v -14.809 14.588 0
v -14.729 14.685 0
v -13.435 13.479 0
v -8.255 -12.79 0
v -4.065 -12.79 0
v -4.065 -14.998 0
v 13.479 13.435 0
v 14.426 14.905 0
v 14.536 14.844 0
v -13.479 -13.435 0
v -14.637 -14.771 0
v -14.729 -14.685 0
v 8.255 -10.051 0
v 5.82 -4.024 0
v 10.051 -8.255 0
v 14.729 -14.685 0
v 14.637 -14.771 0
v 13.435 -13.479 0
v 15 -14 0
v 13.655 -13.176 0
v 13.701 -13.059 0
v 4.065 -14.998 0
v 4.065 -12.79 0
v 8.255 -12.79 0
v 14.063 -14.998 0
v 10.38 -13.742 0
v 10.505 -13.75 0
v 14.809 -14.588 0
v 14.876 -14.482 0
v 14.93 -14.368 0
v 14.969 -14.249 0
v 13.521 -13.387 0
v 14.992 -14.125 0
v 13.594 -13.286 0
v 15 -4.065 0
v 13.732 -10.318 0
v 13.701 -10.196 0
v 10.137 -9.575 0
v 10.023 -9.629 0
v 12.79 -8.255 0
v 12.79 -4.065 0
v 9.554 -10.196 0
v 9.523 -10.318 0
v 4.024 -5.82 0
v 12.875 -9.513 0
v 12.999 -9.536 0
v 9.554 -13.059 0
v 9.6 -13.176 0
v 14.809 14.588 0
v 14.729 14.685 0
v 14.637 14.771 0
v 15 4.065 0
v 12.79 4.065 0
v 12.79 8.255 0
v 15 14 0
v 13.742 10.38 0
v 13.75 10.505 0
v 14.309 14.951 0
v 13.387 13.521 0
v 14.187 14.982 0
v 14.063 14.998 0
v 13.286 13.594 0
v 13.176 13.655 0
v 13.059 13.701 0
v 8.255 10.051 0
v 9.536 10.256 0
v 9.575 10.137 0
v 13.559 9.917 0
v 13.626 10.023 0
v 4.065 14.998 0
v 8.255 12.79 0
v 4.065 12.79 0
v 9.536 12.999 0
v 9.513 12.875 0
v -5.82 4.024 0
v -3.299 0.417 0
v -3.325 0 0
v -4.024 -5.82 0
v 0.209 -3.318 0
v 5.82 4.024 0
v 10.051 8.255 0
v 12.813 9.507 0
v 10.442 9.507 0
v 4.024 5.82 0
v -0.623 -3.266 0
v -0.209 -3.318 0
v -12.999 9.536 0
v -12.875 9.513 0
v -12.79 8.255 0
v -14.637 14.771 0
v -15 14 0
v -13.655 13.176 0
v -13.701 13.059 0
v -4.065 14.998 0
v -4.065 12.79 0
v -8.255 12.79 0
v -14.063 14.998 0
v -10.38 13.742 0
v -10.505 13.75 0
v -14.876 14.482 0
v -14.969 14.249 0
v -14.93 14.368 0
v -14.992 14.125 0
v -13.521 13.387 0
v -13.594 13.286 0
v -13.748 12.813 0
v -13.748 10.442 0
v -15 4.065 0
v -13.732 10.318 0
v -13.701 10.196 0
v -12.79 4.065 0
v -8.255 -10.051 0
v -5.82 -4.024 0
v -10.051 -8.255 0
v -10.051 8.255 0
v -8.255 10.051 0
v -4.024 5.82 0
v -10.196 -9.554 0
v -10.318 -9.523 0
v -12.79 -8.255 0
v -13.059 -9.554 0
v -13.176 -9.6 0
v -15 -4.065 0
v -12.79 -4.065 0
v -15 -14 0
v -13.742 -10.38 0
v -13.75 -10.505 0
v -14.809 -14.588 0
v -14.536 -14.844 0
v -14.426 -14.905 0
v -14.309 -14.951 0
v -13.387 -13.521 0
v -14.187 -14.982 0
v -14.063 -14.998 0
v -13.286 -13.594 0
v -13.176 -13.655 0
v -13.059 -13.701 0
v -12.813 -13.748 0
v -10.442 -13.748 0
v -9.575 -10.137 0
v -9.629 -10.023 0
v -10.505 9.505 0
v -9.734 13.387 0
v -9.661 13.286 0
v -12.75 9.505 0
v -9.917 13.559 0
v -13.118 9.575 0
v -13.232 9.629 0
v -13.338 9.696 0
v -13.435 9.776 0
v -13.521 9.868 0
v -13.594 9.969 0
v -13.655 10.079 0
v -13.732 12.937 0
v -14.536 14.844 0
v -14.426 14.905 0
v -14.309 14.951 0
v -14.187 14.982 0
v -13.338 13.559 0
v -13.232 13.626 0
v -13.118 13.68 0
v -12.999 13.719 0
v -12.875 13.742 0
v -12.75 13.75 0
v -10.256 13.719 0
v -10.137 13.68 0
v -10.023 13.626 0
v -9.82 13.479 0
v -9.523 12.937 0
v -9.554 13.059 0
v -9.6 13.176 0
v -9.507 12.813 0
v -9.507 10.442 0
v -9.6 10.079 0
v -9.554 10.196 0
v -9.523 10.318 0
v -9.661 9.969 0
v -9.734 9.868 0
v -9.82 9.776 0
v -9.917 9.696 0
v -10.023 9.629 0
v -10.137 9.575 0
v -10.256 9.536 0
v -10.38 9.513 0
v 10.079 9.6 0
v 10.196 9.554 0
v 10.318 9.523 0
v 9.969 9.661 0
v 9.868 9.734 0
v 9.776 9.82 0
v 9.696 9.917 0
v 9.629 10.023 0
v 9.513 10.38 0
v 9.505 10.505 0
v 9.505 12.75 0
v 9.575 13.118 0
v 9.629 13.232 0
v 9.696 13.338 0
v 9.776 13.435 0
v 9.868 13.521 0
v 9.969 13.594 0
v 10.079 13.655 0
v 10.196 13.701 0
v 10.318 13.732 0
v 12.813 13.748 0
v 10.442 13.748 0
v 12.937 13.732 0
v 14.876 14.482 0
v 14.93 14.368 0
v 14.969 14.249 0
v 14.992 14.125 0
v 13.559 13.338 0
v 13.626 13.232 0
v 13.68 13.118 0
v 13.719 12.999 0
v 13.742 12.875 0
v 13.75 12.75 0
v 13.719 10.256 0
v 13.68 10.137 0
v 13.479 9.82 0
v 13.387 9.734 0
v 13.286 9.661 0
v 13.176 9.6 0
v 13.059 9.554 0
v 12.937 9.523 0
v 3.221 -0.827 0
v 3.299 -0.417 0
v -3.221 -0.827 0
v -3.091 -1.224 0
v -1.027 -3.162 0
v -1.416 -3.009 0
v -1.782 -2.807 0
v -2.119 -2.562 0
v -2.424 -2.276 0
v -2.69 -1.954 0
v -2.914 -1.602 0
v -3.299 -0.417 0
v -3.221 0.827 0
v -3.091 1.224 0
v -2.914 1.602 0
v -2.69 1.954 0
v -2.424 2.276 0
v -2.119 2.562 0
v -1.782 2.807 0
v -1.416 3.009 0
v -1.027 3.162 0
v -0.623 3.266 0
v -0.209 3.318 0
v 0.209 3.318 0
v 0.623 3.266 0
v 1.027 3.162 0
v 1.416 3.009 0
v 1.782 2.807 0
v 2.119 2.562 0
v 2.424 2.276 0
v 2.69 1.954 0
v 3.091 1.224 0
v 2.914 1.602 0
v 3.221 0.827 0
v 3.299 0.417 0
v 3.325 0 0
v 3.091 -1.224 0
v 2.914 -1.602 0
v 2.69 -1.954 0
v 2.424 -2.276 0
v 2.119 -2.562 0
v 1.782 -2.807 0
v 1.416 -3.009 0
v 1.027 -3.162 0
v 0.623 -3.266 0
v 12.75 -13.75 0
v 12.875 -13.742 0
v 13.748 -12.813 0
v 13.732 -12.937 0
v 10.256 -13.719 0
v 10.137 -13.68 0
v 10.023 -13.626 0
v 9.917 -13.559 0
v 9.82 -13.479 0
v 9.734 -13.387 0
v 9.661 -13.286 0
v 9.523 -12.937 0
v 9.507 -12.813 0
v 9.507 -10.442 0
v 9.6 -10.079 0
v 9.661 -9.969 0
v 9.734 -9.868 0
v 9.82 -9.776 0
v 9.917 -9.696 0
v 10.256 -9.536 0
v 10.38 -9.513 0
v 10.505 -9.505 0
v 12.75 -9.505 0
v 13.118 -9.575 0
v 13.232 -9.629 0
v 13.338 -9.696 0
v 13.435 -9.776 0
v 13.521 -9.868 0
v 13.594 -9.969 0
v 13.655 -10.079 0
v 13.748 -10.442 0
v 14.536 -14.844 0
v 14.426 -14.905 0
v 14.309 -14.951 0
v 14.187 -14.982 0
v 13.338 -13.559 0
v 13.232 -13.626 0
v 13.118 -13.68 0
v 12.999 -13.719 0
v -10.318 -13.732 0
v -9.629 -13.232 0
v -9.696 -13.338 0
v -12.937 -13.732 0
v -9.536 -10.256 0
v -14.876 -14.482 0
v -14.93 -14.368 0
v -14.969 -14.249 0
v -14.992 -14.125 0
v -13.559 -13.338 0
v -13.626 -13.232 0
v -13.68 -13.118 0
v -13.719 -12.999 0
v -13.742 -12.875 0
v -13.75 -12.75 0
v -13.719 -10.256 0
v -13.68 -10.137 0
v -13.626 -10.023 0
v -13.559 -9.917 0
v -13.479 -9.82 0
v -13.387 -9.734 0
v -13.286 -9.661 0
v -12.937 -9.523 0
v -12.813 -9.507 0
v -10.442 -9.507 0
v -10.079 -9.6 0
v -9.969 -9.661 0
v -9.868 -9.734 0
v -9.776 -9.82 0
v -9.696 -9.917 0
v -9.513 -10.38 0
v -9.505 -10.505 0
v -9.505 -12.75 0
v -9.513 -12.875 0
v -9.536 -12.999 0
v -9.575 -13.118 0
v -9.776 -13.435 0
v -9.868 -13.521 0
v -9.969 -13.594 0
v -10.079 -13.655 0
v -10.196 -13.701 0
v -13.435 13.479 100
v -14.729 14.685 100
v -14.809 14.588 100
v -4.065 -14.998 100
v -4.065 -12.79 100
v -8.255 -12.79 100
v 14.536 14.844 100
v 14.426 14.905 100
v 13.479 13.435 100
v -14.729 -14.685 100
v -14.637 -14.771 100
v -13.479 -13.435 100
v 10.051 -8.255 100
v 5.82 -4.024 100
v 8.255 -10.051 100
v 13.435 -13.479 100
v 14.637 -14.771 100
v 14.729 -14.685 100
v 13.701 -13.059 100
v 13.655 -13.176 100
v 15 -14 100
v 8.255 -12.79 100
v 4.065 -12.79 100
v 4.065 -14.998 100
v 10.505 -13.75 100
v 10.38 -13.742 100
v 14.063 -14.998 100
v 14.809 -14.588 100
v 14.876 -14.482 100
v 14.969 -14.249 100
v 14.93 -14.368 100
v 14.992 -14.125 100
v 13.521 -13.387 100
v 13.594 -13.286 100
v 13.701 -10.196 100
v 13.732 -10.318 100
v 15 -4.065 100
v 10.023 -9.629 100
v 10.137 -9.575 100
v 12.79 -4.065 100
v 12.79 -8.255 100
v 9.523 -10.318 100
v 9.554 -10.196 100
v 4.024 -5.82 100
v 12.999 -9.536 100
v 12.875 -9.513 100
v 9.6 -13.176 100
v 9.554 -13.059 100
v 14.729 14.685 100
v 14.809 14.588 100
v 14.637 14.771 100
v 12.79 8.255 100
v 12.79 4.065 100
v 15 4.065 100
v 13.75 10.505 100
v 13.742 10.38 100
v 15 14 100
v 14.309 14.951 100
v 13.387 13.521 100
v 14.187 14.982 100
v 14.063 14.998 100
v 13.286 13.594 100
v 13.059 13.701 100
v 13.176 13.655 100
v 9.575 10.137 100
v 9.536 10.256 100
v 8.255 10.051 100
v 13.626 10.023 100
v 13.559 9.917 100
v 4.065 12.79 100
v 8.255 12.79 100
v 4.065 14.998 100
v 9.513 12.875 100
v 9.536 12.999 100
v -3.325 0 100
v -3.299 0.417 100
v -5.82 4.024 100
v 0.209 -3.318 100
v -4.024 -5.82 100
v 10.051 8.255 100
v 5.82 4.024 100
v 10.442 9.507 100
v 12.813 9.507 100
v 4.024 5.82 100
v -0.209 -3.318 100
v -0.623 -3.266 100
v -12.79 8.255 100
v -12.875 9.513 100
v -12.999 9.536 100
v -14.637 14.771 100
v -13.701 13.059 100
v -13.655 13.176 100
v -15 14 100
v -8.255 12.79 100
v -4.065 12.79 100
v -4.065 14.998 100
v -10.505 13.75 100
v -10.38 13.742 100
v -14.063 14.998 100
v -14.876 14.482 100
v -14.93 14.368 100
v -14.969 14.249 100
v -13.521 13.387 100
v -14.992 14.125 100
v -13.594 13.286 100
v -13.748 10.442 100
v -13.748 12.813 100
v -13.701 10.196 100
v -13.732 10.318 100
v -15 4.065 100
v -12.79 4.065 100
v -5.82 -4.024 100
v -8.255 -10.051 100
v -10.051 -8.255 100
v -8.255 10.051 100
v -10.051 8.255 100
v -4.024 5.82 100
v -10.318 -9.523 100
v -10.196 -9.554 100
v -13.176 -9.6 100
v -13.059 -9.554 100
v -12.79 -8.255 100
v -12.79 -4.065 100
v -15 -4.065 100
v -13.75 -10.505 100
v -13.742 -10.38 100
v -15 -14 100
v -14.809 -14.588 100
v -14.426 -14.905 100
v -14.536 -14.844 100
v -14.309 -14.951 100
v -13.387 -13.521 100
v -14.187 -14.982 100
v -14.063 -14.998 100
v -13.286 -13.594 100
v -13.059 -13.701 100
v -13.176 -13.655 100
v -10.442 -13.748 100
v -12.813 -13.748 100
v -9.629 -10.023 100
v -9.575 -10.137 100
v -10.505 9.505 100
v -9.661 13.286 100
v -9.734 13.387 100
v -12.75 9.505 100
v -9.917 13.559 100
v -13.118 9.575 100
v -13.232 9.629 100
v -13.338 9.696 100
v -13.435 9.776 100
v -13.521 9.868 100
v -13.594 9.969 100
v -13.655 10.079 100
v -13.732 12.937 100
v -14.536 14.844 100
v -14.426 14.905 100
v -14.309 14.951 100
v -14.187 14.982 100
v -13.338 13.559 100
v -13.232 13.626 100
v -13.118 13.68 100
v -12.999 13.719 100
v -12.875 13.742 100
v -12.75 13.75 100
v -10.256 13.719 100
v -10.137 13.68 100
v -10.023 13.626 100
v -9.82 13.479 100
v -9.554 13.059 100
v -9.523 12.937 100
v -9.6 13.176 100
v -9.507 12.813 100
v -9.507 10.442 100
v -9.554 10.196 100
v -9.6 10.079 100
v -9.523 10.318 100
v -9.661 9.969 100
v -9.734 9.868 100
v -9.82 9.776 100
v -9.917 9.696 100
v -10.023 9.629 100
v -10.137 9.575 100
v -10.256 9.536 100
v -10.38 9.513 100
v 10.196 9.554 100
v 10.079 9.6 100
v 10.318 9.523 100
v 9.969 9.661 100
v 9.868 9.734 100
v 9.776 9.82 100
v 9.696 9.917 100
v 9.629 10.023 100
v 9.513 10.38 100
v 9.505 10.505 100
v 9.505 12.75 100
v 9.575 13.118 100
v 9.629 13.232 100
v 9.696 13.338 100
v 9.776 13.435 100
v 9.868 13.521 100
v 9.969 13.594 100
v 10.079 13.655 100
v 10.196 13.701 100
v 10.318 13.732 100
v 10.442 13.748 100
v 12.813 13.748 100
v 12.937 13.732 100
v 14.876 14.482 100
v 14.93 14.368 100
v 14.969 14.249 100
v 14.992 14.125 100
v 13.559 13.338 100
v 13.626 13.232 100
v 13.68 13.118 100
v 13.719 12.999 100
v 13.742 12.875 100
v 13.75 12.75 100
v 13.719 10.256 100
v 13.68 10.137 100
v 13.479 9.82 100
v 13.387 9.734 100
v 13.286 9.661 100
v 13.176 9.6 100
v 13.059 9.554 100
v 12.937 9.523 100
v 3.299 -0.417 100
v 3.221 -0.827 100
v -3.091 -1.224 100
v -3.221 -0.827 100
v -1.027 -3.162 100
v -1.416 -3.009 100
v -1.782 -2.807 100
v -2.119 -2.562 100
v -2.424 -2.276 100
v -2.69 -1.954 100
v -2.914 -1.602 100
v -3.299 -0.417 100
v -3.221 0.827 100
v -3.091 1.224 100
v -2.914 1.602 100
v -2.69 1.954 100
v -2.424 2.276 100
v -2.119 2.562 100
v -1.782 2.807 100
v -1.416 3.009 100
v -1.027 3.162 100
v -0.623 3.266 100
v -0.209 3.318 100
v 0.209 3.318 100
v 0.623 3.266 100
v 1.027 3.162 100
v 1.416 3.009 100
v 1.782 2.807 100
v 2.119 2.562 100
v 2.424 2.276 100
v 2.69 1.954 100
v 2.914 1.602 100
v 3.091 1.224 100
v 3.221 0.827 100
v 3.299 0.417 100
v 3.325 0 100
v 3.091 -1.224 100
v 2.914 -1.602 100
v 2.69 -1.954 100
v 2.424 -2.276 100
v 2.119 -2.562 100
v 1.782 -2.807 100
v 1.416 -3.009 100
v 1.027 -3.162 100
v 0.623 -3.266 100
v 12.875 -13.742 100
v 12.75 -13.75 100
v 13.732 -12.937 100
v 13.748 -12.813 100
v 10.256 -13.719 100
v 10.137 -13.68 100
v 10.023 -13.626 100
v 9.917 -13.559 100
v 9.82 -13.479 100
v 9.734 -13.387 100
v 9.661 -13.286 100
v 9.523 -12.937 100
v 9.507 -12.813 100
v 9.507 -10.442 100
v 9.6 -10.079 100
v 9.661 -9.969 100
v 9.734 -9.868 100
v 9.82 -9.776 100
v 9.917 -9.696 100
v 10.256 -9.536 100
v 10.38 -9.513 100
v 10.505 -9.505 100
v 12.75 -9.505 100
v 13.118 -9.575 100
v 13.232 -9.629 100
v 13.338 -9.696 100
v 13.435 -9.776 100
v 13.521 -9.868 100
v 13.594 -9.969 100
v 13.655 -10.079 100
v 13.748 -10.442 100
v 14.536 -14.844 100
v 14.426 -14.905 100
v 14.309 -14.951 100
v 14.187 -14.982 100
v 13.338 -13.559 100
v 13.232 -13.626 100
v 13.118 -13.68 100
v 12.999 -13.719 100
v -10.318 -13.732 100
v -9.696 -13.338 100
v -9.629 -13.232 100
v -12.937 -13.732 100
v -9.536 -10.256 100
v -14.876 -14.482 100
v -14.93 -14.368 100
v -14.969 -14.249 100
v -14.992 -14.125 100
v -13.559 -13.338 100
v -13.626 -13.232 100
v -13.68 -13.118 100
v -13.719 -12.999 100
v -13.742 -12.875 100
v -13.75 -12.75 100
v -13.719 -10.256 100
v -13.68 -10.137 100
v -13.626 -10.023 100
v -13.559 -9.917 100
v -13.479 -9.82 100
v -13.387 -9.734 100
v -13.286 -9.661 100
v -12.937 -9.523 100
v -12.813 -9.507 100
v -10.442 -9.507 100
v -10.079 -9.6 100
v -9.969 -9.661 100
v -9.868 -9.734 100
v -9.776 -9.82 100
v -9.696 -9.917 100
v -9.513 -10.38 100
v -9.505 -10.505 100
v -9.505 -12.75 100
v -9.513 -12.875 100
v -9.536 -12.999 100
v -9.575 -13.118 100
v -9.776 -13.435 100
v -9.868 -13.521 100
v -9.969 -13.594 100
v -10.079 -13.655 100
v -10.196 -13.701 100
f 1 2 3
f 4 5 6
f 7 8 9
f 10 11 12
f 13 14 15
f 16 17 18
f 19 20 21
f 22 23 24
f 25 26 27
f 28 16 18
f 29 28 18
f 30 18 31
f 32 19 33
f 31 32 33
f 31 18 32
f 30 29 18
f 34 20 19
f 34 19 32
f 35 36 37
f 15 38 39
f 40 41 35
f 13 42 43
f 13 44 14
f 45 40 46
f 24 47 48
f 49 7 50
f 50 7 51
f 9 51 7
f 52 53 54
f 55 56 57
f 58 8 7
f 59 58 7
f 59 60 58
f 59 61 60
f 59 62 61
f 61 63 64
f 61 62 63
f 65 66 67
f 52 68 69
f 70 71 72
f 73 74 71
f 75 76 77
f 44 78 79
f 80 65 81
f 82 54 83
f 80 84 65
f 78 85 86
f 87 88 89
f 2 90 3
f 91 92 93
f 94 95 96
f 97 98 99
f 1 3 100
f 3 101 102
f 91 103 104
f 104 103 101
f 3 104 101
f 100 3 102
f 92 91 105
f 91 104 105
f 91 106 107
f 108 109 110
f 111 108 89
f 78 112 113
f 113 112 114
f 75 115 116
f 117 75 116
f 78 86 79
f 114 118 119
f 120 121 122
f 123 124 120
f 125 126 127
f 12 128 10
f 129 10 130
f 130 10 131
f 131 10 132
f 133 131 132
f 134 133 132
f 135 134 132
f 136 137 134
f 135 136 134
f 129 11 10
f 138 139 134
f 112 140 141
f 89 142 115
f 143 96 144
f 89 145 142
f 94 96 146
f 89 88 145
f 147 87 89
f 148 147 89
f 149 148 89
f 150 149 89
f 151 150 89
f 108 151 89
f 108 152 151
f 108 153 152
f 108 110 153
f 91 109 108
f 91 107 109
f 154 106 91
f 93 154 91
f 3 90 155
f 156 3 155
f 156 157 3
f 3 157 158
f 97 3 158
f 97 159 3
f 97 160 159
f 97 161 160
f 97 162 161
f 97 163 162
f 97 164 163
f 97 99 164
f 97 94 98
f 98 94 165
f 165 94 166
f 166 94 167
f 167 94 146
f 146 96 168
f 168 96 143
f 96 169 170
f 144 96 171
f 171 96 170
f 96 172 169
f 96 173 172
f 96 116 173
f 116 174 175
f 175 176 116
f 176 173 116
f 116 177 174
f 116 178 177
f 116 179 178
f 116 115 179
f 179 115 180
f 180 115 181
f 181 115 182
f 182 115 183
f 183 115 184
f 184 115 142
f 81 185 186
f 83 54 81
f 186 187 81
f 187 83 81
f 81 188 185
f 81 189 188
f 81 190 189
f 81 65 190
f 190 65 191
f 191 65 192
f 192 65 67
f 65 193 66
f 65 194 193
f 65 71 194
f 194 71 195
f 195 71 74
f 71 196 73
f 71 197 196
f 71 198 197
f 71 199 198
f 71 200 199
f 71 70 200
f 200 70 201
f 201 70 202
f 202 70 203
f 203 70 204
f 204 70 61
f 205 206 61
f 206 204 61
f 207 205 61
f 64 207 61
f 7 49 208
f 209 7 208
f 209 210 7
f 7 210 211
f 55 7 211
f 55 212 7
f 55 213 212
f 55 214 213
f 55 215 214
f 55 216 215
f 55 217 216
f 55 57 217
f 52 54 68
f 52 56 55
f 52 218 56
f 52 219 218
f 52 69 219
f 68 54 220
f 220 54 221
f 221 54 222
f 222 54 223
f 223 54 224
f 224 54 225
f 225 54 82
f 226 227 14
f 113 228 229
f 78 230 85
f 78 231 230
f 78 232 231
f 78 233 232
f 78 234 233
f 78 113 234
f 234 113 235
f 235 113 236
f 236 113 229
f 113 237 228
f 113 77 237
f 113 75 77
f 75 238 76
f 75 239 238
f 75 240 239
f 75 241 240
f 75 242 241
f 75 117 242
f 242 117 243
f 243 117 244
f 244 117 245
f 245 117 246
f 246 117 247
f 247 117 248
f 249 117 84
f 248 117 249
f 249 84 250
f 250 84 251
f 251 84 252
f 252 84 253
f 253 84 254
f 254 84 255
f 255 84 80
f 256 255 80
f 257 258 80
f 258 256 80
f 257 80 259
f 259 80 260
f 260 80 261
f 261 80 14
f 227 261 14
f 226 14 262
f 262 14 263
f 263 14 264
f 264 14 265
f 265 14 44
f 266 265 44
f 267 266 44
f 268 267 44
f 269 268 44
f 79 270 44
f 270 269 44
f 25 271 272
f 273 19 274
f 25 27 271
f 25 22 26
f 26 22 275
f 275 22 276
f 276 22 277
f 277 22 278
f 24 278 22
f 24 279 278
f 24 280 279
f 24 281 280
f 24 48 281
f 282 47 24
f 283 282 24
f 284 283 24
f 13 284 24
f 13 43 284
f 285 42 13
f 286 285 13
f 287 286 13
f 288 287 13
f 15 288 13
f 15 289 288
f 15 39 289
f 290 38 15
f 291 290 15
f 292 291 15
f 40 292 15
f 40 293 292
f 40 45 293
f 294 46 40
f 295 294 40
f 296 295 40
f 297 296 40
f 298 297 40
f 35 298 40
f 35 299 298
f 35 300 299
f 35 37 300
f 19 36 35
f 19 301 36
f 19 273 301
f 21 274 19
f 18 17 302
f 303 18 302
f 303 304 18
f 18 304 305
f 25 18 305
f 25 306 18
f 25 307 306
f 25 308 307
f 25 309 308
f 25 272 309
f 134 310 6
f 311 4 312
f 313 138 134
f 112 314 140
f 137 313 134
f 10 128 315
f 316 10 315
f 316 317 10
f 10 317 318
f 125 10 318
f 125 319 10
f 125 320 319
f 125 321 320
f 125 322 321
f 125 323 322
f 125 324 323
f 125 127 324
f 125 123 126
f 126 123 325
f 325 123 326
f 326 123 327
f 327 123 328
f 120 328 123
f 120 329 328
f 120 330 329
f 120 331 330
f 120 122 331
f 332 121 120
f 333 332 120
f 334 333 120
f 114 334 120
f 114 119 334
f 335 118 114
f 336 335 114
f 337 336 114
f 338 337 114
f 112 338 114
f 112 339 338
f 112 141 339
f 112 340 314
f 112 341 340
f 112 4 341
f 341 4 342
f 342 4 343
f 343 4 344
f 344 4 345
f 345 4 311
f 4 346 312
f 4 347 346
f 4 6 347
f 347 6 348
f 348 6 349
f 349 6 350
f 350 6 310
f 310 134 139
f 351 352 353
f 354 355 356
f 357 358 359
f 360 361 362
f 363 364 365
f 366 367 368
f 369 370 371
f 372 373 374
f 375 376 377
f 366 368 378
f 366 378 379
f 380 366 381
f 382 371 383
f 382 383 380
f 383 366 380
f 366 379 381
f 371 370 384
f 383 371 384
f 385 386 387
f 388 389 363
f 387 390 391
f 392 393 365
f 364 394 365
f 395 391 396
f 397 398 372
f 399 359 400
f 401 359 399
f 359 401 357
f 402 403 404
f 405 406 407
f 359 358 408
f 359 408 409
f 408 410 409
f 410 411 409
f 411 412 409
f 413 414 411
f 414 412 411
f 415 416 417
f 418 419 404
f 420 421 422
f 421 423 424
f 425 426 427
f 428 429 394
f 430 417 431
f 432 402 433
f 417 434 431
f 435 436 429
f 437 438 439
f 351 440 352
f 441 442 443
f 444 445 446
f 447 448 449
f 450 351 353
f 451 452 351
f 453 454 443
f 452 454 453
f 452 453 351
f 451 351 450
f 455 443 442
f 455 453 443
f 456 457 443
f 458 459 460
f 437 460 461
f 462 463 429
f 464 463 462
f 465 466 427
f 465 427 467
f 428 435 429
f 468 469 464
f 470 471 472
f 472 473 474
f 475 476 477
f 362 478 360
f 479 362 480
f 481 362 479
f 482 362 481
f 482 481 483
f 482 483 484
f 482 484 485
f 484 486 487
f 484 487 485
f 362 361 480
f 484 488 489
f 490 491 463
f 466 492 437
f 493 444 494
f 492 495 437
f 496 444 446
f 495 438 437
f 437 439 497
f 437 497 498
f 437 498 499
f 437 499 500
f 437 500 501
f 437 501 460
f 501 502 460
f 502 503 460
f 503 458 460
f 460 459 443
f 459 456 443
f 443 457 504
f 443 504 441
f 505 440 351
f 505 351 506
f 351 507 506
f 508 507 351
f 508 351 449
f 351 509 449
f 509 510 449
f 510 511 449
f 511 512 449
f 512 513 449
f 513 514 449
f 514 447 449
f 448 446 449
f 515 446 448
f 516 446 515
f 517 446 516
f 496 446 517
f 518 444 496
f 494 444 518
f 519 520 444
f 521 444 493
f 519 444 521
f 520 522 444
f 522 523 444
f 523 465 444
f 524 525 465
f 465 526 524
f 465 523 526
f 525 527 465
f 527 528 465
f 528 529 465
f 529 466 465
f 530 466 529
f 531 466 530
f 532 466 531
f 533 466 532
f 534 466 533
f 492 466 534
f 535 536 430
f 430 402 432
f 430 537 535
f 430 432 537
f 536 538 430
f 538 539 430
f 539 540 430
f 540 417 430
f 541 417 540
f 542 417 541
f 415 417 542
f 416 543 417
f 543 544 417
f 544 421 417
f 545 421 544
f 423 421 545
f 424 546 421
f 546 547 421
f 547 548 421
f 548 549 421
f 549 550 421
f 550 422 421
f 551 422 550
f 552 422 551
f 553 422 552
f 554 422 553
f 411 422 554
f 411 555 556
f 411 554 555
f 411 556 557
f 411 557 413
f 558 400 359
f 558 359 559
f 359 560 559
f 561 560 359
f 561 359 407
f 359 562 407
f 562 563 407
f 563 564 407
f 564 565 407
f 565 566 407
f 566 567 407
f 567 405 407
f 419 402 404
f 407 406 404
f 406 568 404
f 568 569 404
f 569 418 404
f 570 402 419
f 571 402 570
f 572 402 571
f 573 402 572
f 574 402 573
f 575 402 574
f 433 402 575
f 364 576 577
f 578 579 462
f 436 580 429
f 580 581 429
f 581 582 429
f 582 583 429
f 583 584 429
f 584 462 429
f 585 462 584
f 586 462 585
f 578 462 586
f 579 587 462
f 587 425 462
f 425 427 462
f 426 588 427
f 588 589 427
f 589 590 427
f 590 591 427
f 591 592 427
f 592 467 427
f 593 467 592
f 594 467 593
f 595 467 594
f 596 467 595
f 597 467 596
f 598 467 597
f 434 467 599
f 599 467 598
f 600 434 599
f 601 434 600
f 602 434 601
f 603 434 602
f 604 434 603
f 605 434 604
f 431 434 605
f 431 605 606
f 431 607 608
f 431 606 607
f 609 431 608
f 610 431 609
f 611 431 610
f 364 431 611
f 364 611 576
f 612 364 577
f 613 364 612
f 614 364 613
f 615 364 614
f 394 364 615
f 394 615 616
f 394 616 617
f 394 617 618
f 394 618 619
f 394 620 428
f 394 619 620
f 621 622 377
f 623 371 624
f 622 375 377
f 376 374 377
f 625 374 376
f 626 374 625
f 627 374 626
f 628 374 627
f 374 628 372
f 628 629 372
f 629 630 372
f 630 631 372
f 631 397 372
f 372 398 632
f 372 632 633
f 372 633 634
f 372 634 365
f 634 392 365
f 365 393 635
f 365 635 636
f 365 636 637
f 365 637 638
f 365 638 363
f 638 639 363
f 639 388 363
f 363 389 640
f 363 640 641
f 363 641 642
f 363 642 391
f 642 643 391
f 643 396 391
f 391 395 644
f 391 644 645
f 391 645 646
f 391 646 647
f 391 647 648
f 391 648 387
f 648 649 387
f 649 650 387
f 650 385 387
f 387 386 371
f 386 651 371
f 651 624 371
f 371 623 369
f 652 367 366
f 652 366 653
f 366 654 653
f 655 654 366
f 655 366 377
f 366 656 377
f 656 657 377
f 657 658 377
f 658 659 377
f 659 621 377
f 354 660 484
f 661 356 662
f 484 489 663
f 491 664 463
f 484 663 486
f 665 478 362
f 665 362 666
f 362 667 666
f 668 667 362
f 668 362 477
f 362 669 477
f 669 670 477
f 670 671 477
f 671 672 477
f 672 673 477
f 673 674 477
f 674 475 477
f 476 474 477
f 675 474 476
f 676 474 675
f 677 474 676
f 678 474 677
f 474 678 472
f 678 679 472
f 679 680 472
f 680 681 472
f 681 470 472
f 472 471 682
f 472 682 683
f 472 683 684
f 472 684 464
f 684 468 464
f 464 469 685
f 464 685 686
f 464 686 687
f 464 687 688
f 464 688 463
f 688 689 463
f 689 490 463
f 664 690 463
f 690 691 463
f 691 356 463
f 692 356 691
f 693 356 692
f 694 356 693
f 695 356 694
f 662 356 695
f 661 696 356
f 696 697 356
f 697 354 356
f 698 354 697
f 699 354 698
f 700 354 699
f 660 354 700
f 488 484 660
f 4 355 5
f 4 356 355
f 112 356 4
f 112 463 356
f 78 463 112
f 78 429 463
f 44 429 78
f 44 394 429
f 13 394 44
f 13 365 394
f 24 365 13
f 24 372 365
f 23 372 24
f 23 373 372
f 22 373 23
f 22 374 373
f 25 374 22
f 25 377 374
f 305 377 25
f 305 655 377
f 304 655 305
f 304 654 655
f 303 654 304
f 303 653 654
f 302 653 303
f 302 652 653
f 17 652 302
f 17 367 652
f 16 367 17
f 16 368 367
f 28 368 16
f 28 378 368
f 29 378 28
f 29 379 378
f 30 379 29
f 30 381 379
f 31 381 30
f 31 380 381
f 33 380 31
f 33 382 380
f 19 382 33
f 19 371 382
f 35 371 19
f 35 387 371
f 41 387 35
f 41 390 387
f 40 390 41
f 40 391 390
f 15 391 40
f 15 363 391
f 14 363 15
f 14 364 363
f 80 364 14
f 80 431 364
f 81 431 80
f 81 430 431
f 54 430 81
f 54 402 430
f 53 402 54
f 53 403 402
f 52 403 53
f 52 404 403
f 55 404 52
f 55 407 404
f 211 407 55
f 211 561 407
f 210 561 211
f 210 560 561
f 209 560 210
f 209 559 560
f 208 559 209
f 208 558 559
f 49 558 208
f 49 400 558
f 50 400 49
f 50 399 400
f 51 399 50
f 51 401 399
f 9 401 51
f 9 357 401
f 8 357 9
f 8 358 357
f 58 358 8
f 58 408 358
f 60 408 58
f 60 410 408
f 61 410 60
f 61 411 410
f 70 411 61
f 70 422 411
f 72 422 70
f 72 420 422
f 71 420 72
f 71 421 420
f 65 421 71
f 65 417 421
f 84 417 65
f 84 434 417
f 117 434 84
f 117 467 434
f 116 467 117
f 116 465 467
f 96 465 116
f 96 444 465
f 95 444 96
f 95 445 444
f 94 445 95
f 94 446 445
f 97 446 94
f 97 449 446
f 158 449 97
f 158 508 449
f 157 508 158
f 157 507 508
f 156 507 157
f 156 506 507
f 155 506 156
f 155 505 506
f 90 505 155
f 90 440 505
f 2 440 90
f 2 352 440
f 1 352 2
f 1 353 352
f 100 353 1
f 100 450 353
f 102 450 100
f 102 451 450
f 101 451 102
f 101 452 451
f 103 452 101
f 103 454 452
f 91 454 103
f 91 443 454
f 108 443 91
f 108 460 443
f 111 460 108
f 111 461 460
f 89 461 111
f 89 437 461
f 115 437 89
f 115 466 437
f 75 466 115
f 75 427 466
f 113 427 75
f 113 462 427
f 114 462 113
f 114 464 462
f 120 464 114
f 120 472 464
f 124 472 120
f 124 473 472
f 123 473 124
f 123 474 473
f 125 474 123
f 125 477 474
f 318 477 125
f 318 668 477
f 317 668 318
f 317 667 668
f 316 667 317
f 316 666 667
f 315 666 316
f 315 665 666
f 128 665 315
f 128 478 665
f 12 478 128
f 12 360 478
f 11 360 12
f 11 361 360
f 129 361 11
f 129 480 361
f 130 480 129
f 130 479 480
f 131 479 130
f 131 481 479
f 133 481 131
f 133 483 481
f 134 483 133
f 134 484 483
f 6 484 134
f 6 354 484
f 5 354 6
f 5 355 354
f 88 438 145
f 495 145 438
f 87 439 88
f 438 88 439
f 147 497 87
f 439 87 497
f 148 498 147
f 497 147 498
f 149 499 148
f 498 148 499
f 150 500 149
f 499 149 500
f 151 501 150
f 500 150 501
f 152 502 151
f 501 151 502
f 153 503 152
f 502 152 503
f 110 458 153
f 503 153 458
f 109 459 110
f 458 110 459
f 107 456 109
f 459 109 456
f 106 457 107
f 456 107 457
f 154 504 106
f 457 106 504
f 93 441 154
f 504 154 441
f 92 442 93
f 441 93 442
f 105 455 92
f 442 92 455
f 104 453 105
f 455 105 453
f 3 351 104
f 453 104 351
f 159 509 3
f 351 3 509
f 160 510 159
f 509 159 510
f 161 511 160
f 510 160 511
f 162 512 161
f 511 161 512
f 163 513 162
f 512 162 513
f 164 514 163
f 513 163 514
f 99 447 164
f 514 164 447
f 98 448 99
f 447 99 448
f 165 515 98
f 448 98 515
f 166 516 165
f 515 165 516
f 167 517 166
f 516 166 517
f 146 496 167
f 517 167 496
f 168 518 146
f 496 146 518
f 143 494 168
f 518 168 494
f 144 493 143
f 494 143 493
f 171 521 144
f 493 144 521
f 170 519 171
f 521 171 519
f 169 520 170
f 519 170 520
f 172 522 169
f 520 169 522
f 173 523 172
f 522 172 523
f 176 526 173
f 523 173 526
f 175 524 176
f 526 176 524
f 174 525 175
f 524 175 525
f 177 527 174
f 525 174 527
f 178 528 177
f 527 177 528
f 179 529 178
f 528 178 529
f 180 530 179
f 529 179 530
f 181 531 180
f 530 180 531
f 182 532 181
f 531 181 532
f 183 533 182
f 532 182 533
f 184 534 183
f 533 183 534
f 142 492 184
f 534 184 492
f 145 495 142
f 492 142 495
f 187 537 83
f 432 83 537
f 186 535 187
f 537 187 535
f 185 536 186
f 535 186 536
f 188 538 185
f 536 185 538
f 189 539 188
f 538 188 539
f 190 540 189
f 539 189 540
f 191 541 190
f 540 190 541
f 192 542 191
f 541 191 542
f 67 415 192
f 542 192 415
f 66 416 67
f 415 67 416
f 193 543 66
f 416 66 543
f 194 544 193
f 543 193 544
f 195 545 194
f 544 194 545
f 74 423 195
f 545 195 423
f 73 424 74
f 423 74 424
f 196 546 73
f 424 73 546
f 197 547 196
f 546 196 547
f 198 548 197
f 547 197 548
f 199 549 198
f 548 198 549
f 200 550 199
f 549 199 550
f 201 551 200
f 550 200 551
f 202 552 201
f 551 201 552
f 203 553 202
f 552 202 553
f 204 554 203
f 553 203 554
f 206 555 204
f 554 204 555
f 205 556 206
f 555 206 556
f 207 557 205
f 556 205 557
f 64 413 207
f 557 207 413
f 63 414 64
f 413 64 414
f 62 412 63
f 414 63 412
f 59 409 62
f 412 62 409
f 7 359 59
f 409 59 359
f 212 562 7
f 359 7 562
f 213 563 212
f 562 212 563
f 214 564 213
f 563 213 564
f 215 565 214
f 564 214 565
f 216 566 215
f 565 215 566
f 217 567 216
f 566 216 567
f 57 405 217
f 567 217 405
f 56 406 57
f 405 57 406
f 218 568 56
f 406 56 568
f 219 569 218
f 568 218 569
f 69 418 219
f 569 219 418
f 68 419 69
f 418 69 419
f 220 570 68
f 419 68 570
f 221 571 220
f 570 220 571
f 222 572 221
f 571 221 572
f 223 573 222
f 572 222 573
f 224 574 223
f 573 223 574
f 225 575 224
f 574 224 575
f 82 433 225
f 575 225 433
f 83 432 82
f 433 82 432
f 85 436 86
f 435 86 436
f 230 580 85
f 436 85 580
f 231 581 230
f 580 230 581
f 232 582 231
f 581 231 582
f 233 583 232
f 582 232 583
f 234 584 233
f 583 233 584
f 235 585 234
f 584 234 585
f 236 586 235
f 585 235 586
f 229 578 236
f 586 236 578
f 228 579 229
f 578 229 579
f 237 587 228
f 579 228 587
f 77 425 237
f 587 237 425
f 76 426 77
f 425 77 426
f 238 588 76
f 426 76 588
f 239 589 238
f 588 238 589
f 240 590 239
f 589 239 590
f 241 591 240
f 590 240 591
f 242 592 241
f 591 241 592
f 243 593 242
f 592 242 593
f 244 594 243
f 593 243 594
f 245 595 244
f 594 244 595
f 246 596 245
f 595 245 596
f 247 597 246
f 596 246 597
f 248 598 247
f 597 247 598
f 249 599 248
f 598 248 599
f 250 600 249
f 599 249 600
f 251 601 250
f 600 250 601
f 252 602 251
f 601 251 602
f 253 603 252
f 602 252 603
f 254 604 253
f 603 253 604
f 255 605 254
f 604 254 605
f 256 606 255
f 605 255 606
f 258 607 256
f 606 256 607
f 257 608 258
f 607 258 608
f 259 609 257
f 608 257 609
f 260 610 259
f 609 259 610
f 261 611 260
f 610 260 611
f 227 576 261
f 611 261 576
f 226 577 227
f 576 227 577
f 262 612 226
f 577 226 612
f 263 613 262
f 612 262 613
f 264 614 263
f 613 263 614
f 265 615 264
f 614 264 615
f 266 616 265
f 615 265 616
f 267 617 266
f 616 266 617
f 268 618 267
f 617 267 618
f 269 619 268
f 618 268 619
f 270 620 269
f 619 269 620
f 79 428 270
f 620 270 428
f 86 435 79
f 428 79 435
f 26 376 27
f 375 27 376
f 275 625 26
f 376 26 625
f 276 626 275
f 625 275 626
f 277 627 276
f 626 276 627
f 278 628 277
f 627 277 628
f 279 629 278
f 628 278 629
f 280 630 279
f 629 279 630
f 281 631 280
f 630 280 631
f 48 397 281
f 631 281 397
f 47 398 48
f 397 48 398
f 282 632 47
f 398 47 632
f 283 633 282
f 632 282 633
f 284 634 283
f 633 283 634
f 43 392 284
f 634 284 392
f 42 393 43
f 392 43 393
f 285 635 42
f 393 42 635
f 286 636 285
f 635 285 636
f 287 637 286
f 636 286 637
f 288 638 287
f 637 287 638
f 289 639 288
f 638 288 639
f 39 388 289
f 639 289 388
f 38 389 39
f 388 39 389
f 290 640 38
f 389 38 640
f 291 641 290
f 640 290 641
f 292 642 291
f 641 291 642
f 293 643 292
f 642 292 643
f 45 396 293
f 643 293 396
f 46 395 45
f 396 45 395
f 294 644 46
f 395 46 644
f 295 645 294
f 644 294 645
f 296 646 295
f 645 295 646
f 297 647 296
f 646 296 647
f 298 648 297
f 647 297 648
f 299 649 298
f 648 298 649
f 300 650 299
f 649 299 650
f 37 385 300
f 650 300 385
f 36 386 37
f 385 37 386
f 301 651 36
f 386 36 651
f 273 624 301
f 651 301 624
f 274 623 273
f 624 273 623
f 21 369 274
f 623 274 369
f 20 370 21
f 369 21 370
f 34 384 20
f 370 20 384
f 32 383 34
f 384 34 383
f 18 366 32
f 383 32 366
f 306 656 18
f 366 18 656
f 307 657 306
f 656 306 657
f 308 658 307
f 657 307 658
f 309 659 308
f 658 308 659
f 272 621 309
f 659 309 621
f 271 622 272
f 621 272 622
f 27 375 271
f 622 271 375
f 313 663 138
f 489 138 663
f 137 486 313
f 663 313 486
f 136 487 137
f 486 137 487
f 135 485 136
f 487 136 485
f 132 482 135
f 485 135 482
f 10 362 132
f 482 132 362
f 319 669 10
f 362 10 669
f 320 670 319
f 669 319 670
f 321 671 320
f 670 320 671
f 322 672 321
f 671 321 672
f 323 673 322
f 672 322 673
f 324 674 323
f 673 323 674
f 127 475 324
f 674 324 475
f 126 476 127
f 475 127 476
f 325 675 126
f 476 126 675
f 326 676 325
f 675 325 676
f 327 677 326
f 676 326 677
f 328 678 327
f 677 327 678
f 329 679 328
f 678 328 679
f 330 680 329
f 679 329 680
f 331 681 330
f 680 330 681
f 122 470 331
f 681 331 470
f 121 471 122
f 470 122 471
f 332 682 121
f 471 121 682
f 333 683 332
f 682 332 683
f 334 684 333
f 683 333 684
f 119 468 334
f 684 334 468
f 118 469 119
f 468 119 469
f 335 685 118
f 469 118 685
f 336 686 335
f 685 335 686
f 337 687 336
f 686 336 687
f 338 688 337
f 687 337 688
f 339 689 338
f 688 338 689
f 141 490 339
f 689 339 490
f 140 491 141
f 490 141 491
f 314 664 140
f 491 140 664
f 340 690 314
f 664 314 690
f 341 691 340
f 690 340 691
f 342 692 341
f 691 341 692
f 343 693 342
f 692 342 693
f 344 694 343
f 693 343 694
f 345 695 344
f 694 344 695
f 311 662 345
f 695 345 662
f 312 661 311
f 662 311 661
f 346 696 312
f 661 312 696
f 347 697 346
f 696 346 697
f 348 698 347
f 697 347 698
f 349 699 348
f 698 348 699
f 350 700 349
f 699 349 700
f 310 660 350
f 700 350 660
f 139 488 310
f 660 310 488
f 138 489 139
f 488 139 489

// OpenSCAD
length=100;

tslot30();

module tslot30() {
    $fn=50;
    height=30; 
    inner_size=11.64;
    diag_width=2.54;
    gap=8.13;
    inner_depth=6.8;
    full_depth=9.18;
    through_rad=6.65/2;
    inside_gap=16.51;
    edge_thickness=2.21;
    
    module outer_edge() {
        intersection() {
            difference() {
                union() {
                    difference() {
                            square(size=height, center=true);    
                            
                        square(size=(height-edge_thickness*2), center=true);            
                        for(rot = [0:90:270]) {
                            rotate([0,0,rot]) 
                            translate([0,height/2,0])
                            square([gap,10],true);
                        }
                    }
                    corner_boxes();            
                    diag_beams();
                }
                corner_cutouts();        
            }    
            minkowski() {
                            square(size=height-2, center=true);    
                            circle(r=1);
                        }
        }
    }

    module corner_boxes() {
        for(rot=[0:90:270]) {
            rotate([0,0,rot])
            translate([-height/2,-height/2,0])        
            square(size=(height-inside_gap)/2);
        }    
    }

    module corner_cutouts() {   
        for(rot=[0:90:270]) {
            rotate([0,0,rot])
            translate([(-height/2)+2.25,(-height/2)+2.25,0])
            minkowski() {
                square(size=((height-inside_gap)/2)-2.5-2);
                circle(r=1);
            }
        }
    }

    module inner_section() {
        difference() {
            square(size=inner_size,center=true);
            circle(through_rad);
        }
    }

    module diag_beams() {
        for(rot = [45:90:90*3+45]) {
            rotate([0,0,rot]) 
            translate([-diag_width/2,5,0])
            square([diag_width,13
            ], false);
        }
    }

    linear_extrude(length) {
        outer_edge();
        inner_section();
    }

}
